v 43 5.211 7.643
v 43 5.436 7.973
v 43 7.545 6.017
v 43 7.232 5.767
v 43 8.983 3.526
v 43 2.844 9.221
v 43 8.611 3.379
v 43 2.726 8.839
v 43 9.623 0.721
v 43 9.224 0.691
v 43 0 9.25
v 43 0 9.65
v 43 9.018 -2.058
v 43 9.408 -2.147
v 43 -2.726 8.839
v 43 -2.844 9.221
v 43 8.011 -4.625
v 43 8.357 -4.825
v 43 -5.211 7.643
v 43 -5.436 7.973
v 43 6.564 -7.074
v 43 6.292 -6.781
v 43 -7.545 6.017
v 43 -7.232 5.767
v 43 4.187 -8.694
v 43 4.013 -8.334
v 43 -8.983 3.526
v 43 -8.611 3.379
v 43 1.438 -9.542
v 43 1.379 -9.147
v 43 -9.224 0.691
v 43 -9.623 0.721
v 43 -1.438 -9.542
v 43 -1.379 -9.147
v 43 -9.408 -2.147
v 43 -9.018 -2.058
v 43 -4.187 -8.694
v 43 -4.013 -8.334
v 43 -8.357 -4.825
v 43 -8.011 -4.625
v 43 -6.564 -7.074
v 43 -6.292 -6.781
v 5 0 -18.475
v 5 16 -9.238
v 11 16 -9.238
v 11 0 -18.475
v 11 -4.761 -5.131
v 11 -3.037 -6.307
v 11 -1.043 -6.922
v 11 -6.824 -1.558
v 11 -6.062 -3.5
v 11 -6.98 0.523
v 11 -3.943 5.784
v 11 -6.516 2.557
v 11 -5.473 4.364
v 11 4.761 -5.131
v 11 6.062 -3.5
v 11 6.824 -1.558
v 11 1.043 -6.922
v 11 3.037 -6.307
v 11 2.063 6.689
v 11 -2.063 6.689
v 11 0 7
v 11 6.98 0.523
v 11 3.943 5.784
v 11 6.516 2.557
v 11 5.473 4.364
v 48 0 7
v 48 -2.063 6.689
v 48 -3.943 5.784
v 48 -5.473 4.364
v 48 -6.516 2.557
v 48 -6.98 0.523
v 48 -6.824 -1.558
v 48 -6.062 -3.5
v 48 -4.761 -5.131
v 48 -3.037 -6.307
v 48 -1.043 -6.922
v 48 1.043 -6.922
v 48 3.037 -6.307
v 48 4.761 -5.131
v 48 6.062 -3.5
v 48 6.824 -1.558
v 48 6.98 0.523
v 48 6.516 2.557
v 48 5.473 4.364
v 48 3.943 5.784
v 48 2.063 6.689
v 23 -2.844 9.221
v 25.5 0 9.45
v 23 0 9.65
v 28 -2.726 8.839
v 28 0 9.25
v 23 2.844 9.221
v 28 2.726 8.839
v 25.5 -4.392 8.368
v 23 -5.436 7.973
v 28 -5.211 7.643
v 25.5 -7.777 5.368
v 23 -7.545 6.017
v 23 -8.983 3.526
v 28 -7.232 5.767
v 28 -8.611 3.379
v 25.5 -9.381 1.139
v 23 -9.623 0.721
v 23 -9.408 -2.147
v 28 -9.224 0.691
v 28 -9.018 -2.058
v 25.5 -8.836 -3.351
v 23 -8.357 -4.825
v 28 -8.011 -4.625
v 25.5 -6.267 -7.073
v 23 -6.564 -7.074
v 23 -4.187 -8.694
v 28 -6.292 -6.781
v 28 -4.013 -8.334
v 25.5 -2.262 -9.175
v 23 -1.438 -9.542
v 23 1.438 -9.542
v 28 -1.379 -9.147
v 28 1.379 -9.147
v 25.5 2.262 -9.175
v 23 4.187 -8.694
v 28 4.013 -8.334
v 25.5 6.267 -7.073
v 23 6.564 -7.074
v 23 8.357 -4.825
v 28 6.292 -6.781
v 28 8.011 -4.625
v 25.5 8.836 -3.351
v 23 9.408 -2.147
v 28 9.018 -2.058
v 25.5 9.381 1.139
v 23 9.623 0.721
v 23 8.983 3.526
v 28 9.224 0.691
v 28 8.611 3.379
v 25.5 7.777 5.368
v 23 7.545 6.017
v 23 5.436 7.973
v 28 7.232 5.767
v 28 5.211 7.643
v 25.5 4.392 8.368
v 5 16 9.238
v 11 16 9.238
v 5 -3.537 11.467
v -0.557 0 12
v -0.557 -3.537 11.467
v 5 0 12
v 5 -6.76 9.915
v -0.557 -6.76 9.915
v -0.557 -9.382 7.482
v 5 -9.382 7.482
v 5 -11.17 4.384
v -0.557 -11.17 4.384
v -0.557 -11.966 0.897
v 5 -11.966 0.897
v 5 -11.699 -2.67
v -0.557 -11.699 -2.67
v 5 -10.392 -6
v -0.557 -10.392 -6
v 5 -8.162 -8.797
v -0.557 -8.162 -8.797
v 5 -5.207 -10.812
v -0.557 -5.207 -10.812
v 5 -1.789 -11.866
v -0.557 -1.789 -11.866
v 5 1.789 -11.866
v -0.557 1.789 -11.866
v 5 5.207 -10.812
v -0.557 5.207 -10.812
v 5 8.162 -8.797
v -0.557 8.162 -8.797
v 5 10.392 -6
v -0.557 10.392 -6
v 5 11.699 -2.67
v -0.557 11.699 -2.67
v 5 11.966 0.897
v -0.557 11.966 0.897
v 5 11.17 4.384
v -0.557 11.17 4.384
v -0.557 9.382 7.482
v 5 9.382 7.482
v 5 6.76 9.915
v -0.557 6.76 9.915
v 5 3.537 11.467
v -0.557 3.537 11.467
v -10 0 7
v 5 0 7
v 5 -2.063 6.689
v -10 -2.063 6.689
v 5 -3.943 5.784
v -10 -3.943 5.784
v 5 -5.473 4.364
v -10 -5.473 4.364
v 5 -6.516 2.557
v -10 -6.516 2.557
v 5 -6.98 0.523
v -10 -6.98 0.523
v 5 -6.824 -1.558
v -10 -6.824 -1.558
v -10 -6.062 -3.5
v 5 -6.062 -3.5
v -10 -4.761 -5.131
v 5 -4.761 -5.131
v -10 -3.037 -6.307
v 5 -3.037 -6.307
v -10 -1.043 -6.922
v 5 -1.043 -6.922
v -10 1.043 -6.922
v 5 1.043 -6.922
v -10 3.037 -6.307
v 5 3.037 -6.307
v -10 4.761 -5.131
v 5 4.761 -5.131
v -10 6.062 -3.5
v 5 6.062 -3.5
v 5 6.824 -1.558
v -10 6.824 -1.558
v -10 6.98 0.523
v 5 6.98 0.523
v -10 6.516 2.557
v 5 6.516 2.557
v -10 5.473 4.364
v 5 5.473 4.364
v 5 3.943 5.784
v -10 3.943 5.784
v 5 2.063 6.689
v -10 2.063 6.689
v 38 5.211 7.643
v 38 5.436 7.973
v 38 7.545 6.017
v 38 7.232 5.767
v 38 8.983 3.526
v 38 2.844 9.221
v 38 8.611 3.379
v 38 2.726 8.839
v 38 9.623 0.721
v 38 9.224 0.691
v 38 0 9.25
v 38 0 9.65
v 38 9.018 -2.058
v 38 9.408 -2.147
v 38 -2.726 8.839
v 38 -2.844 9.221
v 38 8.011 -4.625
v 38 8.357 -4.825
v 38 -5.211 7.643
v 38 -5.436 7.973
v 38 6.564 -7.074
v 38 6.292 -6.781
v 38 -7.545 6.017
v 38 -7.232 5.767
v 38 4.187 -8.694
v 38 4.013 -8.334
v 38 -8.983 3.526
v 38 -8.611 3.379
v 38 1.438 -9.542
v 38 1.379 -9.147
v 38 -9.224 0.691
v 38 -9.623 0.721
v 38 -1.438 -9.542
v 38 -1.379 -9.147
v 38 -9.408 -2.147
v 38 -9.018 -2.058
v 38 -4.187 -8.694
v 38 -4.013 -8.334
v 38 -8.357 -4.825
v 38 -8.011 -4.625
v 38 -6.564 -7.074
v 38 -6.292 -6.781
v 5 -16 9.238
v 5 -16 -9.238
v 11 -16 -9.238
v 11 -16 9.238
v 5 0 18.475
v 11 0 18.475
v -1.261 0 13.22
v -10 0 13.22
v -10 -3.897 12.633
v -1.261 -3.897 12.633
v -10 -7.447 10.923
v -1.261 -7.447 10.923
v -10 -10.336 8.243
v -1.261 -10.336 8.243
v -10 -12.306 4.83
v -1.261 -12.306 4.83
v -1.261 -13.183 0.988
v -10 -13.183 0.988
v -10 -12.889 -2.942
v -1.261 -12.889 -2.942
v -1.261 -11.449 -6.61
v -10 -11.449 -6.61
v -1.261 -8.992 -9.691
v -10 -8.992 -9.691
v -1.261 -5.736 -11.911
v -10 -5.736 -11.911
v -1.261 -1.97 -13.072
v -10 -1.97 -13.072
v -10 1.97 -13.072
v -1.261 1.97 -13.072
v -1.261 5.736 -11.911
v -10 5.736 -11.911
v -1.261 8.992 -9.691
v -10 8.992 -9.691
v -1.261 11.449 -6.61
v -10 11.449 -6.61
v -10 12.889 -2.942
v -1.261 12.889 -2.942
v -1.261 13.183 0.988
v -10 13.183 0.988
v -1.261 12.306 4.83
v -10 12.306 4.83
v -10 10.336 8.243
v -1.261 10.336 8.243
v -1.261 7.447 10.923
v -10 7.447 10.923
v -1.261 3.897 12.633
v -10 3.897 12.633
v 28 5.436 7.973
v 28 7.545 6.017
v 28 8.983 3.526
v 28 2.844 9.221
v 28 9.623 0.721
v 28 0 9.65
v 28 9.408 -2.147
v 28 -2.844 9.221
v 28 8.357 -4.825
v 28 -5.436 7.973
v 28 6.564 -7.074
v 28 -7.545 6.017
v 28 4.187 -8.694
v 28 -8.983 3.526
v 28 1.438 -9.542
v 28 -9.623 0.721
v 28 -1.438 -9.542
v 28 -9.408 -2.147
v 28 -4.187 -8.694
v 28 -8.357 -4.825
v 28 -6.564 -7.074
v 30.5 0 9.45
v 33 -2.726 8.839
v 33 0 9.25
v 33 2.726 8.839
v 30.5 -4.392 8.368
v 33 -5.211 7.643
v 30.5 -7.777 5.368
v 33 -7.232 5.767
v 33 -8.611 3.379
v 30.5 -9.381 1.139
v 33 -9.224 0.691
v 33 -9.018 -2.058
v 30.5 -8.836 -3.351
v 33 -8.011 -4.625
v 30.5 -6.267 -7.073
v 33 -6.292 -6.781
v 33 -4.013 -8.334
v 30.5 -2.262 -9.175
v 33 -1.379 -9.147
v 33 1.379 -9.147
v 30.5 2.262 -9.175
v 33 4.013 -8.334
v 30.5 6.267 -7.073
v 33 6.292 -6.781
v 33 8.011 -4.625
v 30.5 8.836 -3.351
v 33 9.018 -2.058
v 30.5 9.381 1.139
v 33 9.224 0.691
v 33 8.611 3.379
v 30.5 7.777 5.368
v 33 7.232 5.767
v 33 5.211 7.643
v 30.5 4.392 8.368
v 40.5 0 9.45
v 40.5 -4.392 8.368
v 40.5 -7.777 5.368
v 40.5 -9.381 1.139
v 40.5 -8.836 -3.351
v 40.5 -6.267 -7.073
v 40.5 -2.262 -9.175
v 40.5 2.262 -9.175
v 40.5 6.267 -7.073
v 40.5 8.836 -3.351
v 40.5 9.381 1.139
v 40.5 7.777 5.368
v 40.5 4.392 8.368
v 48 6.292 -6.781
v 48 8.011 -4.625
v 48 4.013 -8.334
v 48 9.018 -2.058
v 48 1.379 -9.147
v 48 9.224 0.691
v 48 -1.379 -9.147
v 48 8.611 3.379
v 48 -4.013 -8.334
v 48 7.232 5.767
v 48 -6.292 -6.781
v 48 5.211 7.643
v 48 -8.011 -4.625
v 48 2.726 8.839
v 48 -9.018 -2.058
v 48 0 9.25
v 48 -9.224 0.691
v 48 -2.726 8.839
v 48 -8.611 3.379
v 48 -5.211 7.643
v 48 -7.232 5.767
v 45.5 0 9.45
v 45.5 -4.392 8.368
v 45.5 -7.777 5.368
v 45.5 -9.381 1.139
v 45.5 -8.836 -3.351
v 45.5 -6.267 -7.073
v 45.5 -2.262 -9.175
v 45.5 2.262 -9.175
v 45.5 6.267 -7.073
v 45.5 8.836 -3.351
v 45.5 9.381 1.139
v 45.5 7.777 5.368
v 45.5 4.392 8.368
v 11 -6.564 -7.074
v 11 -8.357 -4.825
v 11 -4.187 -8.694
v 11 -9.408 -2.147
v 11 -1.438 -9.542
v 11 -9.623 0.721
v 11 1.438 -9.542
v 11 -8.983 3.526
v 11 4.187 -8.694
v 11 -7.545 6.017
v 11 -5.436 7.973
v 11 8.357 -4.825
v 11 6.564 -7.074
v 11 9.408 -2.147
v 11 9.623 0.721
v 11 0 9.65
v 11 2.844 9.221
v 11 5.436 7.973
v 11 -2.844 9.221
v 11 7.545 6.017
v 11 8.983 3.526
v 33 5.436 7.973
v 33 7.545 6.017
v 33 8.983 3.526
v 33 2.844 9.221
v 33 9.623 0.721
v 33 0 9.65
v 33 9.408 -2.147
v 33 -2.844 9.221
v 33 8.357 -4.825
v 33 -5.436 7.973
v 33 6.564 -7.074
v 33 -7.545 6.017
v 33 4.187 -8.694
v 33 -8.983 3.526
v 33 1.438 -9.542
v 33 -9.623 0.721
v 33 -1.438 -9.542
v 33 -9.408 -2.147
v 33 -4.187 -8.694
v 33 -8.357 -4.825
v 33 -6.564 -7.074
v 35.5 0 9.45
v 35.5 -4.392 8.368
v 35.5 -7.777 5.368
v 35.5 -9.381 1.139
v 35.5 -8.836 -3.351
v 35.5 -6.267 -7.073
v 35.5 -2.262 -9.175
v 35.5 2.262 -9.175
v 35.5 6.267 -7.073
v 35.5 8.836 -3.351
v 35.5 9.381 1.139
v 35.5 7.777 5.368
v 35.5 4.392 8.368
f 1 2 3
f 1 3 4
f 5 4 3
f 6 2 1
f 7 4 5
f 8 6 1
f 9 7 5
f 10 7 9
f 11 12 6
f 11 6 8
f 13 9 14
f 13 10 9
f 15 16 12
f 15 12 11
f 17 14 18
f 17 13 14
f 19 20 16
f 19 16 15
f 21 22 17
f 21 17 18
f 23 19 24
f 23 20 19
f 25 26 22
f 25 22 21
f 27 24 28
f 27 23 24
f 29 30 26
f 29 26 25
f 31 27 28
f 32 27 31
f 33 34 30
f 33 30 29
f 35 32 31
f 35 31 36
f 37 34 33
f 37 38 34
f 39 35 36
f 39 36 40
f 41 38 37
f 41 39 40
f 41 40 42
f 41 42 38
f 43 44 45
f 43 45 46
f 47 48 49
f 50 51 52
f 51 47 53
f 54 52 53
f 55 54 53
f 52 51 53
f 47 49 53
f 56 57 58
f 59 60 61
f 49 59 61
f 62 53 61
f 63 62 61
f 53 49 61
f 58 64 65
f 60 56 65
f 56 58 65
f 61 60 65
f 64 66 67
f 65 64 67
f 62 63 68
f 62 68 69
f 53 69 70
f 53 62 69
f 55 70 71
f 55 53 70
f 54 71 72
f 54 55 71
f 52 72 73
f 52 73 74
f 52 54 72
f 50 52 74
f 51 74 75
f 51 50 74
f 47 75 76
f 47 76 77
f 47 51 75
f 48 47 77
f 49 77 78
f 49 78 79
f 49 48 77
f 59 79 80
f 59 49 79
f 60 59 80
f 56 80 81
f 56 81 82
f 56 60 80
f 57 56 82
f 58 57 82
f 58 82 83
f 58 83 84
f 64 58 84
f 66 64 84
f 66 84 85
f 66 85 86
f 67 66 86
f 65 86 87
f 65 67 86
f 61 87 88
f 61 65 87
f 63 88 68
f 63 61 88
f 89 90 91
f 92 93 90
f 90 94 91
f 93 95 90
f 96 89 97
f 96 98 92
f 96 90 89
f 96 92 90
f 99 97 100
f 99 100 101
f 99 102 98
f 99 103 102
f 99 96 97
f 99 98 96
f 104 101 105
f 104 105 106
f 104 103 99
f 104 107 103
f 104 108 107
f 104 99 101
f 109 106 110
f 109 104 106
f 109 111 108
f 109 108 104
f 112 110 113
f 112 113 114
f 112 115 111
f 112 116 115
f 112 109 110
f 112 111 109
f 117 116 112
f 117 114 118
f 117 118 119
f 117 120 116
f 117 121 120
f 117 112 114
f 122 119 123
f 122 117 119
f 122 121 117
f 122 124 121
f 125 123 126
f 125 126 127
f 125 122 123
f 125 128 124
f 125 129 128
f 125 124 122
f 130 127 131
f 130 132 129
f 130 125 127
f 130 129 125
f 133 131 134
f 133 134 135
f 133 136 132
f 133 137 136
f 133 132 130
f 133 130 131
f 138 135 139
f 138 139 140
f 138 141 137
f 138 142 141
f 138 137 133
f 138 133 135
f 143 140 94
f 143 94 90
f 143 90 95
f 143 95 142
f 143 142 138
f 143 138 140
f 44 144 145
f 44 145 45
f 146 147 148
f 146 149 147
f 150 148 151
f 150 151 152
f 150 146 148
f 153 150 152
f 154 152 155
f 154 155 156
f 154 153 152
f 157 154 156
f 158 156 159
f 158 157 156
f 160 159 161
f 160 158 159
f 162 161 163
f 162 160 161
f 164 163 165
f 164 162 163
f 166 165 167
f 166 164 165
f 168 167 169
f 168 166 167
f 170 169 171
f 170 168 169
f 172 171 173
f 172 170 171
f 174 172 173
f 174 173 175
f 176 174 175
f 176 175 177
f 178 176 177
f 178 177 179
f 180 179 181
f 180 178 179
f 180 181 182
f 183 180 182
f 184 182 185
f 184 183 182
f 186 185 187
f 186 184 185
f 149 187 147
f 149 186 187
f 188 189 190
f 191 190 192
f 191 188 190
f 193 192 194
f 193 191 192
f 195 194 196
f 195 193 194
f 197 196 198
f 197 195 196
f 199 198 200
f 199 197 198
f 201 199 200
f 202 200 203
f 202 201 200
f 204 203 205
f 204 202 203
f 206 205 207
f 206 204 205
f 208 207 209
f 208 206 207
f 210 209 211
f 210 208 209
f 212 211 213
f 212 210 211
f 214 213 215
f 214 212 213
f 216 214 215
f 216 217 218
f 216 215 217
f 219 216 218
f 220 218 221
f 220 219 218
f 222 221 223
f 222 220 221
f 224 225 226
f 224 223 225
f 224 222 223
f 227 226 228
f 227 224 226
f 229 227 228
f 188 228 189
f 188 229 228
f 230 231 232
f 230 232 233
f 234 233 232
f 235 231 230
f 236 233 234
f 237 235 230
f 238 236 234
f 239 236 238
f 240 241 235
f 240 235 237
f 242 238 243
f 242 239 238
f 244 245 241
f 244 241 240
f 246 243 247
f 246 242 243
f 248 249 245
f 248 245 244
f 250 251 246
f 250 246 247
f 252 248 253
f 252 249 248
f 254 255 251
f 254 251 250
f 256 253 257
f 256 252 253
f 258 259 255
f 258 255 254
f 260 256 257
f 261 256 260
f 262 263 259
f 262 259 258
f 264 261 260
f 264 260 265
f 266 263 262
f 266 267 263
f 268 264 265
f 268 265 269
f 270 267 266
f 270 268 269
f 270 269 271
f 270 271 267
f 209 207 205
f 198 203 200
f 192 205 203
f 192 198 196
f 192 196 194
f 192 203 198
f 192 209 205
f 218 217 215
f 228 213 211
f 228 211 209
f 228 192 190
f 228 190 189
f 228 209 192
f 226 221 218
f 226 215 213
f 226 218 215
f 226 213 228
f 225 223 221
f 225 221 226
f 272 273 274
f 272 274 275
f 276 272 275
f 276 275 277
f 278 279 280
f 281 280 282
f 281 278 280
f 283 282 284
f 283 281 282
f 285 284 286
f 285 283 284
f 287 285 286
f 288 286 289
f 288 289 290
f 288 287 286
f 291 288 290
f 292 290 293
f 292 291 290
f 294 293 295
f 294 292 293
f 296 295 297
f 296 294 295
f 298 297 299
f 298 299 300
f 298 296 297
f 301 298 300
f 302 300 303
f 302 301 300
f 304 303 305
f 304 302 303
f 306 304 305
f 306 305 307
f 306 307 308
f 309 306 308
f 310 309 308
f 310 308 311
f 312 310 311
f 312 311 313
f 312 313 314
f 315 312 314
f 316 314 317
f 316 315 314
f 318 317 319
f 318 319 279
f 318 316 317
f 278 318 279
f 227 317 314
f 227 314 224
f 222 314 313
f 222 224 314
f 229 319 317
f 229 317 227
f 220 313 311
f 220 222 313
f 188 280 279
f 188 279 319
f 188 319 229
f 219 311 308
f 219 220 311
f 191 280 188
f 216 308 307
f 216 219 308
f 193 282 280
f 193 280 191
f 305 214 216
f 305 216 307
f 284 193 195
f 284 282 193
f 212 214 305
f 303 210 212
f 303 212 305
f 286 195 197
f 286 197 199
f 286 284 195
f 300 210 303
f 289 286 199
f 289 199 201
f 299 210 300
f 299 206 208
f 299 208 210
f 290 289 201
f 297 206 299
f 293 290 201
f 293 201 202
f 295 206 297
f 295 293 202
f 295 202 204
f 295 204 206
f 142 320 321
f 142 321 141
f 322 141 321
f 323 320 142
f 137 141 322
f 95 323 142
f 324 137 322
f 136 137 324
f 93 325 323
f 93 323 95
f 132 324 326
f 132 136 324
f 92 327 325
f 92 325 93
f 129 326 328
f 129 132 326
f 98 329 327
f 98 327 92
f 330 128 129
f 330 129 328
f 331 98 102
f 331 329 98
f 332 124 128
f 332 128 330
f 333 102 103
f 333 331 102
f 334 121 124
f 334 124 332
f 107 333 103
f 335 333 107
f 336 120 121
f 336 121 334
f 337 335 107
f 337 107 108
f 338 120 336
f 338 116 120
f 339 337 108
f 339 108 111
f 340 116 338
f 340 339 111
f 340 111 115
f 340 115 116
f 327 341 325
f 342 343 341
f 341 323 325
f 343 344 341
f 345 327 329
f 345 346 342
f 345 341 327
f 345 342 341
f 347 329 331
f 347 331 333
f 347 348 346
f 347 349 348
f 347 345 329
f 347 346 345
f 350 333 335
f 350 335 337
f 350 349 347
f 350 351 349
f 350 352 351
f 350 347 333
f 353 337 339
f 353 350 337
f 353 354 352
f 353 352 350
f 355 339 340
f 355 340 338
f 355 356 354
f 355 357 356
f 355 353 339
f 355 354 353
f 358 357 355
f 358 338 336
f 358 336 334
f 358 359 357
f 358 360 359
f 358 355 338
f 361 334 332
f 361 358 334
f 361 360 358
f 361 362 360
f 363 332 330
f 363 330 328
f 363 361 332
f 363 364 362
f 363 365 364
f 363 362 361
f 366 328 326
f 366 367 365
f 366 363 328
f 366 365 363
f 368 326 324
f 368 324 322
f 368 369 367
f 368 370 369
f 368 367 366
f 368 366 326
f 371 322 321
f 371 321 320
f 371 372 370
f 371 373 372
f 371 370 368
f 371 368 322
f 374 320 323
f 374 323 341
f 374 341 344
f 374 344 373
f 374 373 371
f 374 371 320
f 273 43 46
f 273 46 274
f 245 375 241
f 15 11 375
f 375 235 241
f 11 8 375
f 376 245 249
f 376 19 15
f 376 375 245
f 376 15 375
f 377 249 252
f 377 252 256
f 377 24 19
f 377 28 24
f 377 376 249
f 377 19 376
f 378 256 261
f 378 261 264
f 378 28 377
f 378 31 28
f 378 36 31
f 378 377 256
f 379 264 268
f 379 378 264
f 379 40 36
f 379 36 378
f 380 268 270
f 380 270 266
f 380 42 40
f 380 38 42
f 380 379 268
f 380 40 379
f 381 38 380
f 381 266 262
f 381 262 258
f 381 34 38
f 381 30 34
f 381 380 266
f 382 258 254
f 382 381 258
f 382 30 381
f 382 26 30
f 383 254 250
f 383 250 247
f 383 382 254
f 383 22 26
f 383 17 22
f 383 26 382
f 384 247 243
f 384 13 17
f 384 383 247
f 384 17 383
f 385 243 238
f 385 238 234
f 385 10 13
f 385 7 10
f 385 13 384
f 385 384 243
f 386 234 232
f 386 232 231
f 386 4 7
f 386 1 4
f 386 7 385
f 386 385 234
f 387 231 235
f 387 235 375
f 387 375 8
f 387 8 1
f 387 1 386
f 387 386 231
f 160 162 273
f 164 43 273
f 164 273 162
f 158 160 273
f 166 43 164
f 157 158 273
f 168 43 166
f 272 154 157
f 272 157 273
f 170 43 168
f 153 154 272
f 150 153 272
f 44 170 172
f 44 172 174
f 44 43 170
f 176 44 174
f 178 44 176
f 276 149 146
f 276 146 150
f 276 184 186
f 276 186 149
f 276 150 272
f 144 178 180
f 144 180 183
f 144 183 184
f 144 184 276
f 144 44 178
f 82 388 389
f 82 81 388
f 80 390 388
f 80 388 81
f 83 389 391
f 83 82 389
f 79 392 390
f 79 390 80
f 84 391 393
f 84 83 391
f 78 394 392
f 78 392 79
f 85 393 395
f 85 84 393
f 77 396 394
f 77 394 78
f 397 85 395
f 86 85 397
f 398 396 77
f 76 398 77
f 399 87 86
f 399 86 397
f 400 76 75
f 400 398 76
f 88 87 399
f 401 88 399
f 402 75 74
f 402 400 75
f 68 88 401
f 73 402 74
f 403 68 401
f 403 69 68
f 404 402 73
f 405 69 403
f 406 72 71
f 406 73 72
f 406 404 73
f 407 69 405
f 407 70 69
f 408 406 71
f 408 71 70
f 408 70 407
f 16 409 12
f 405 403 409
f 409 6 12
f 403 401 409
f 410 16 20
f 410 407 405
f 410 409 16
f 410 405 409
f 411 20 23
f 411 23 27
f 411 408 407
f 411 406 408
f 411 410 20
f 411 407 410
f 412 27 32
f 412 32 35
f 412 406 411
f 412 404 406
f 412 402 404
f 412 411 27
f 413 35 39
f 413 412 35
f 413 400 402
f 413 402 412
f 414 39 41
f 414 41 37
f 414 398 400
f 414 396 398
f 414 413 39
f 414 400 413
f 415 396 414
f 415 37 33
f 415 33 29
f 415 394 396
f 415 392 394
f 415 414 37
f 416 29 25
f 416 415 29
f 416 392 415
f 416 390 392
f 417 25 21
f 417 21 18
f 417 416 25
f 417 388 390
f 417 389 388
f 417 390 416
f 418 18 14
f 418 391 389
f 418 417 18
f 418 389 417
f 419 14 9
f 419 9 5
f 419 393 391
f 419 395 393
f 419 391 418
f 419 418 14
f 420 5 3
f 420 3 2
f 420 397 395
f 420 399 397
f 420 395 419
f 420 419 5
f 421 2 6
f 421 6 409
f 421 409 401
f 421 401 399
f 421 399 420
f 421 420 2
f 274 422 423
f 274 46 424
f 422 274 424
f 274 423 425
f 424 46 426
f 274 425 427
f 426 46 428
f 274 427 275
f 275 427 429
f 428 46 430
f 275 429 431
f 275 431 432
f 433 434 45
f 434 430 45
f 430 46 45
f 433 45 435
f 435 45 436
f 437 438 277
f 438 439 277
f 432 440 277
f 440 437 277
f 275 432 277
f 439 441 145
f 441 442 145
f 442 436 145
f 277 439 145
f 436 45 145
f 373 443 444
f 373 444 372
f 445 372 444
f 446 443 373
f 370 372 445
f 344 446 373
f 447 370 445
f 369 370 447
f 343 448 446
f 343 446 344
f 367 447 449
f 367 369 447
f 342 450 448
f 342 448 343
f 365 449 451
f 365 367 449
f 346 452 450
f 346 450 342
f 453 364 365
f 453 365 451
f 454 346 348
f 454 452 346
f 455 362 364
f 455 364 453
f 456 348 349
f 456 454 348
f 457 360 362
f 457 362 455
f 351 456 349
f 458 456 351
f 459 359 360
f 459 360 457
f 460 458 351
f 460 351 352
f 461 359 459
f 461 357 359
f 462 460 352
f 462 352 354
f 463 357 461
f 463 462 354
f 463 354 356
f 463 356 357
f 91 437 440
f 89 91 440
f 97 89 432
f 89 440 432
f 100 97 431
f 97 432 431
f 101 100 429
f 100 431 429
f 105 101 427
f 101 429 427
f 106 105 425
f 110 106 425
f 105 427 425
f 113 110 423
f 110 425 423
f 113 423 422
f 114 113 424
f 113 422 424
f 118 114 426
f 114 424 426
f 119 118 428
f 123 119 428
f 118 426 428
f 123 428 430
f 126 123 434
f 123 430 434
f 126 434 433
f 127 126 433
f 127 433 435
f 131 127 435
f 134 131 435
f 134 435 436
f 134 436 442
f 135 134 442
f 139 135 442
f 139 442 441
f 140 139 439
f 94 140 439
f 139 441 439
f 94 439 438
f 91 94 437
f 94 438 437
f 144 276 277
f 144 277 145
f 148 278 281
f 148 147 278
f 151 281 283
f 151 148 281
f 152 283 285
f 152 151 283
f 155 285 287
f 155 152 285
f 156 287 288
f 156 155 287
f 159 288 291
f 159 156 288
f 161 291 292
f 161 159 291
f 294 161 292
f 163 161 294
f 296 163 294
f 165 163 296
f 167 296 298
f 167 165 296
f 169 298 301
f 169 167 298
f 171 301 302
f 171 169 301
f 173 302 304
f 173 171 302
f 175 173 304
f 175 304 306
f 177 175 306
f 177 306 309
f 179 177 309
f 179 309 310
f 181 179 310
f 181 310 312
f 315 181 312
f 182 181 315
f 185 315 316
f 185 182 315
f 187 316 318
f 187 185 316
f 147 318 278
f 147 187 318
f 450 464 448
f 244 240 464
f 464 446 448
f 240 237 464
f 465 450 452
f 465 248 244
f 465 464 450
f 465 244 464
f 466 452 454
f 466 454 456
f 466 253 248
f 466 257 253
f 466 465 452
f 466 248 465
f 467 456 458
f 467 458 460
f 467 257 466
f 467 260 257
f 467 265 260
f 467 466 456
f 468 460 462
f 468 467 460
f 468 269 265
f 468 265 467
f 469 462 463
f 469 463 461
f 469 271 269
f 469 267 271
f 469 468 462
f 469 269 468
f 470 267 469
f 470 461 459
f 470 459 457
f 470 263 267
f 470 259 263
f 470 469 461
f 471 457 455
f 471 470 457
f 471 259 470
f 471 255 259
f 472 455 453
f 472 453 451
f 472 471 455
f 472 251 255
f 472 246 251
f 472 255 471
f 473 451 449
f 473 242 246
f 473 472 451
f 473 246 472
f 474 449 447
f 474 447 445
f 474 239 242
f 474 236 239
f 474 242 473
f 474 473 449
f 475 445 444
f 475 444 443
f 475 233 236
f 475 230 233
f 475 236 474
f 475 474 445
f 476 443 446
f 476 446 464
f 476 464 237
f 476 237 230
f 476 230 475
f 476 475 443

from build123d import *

# Parameters (mm, degrees)
LINEAR_AUSTRAGEN1_DEPTH = 6


with BuildPart() as part:
    # Skizze2 → Rotation1 (revolve)
    with BuildSketch(Plane.XY):
        Polygon((5, 13.22), (5, 9.65), (21, 9.65), (23, 9.65), (28, 9.25), (28, 9.65), (33, 9.25), (33, 9.65), (38, 9.25), (38, 9.65), (43, 9.25), (43, 9.65), (48, 9.25), (48, 7), (-10, 7), (-10, 13.22), align=None)
    revolve(axis=Axis((-12.825745381, 0, 0), (1, 0, 0)))

    # Skizze4 → Linear austragen1 (add)
    with BuildSketch(Plane.ZY.offset(-5)):
        Polygon((9.237604307, -16), (18.475208614, 0), (9.237604307, 16), (-9.237604307, 16), (-18.475208614, 0), (-9.237604307, -16), align=None)
    extrude(amount=-LINEAR_AUSTRAGEN1_DEPTH)

    # Skizze5 → Schnitt-Rotation1 (revolve, cut)
    with BuildSketch(Plane.XY):
        Polygon((-2, 14.5), (-0.556624327, 12), (5, 12), (5, 14.5), align=None)
    revolve(axis=Axis((-12.825745381, 0, 0), (1, 0, 0)), mode=Mode.SUBTRACT)


solid = part.part
